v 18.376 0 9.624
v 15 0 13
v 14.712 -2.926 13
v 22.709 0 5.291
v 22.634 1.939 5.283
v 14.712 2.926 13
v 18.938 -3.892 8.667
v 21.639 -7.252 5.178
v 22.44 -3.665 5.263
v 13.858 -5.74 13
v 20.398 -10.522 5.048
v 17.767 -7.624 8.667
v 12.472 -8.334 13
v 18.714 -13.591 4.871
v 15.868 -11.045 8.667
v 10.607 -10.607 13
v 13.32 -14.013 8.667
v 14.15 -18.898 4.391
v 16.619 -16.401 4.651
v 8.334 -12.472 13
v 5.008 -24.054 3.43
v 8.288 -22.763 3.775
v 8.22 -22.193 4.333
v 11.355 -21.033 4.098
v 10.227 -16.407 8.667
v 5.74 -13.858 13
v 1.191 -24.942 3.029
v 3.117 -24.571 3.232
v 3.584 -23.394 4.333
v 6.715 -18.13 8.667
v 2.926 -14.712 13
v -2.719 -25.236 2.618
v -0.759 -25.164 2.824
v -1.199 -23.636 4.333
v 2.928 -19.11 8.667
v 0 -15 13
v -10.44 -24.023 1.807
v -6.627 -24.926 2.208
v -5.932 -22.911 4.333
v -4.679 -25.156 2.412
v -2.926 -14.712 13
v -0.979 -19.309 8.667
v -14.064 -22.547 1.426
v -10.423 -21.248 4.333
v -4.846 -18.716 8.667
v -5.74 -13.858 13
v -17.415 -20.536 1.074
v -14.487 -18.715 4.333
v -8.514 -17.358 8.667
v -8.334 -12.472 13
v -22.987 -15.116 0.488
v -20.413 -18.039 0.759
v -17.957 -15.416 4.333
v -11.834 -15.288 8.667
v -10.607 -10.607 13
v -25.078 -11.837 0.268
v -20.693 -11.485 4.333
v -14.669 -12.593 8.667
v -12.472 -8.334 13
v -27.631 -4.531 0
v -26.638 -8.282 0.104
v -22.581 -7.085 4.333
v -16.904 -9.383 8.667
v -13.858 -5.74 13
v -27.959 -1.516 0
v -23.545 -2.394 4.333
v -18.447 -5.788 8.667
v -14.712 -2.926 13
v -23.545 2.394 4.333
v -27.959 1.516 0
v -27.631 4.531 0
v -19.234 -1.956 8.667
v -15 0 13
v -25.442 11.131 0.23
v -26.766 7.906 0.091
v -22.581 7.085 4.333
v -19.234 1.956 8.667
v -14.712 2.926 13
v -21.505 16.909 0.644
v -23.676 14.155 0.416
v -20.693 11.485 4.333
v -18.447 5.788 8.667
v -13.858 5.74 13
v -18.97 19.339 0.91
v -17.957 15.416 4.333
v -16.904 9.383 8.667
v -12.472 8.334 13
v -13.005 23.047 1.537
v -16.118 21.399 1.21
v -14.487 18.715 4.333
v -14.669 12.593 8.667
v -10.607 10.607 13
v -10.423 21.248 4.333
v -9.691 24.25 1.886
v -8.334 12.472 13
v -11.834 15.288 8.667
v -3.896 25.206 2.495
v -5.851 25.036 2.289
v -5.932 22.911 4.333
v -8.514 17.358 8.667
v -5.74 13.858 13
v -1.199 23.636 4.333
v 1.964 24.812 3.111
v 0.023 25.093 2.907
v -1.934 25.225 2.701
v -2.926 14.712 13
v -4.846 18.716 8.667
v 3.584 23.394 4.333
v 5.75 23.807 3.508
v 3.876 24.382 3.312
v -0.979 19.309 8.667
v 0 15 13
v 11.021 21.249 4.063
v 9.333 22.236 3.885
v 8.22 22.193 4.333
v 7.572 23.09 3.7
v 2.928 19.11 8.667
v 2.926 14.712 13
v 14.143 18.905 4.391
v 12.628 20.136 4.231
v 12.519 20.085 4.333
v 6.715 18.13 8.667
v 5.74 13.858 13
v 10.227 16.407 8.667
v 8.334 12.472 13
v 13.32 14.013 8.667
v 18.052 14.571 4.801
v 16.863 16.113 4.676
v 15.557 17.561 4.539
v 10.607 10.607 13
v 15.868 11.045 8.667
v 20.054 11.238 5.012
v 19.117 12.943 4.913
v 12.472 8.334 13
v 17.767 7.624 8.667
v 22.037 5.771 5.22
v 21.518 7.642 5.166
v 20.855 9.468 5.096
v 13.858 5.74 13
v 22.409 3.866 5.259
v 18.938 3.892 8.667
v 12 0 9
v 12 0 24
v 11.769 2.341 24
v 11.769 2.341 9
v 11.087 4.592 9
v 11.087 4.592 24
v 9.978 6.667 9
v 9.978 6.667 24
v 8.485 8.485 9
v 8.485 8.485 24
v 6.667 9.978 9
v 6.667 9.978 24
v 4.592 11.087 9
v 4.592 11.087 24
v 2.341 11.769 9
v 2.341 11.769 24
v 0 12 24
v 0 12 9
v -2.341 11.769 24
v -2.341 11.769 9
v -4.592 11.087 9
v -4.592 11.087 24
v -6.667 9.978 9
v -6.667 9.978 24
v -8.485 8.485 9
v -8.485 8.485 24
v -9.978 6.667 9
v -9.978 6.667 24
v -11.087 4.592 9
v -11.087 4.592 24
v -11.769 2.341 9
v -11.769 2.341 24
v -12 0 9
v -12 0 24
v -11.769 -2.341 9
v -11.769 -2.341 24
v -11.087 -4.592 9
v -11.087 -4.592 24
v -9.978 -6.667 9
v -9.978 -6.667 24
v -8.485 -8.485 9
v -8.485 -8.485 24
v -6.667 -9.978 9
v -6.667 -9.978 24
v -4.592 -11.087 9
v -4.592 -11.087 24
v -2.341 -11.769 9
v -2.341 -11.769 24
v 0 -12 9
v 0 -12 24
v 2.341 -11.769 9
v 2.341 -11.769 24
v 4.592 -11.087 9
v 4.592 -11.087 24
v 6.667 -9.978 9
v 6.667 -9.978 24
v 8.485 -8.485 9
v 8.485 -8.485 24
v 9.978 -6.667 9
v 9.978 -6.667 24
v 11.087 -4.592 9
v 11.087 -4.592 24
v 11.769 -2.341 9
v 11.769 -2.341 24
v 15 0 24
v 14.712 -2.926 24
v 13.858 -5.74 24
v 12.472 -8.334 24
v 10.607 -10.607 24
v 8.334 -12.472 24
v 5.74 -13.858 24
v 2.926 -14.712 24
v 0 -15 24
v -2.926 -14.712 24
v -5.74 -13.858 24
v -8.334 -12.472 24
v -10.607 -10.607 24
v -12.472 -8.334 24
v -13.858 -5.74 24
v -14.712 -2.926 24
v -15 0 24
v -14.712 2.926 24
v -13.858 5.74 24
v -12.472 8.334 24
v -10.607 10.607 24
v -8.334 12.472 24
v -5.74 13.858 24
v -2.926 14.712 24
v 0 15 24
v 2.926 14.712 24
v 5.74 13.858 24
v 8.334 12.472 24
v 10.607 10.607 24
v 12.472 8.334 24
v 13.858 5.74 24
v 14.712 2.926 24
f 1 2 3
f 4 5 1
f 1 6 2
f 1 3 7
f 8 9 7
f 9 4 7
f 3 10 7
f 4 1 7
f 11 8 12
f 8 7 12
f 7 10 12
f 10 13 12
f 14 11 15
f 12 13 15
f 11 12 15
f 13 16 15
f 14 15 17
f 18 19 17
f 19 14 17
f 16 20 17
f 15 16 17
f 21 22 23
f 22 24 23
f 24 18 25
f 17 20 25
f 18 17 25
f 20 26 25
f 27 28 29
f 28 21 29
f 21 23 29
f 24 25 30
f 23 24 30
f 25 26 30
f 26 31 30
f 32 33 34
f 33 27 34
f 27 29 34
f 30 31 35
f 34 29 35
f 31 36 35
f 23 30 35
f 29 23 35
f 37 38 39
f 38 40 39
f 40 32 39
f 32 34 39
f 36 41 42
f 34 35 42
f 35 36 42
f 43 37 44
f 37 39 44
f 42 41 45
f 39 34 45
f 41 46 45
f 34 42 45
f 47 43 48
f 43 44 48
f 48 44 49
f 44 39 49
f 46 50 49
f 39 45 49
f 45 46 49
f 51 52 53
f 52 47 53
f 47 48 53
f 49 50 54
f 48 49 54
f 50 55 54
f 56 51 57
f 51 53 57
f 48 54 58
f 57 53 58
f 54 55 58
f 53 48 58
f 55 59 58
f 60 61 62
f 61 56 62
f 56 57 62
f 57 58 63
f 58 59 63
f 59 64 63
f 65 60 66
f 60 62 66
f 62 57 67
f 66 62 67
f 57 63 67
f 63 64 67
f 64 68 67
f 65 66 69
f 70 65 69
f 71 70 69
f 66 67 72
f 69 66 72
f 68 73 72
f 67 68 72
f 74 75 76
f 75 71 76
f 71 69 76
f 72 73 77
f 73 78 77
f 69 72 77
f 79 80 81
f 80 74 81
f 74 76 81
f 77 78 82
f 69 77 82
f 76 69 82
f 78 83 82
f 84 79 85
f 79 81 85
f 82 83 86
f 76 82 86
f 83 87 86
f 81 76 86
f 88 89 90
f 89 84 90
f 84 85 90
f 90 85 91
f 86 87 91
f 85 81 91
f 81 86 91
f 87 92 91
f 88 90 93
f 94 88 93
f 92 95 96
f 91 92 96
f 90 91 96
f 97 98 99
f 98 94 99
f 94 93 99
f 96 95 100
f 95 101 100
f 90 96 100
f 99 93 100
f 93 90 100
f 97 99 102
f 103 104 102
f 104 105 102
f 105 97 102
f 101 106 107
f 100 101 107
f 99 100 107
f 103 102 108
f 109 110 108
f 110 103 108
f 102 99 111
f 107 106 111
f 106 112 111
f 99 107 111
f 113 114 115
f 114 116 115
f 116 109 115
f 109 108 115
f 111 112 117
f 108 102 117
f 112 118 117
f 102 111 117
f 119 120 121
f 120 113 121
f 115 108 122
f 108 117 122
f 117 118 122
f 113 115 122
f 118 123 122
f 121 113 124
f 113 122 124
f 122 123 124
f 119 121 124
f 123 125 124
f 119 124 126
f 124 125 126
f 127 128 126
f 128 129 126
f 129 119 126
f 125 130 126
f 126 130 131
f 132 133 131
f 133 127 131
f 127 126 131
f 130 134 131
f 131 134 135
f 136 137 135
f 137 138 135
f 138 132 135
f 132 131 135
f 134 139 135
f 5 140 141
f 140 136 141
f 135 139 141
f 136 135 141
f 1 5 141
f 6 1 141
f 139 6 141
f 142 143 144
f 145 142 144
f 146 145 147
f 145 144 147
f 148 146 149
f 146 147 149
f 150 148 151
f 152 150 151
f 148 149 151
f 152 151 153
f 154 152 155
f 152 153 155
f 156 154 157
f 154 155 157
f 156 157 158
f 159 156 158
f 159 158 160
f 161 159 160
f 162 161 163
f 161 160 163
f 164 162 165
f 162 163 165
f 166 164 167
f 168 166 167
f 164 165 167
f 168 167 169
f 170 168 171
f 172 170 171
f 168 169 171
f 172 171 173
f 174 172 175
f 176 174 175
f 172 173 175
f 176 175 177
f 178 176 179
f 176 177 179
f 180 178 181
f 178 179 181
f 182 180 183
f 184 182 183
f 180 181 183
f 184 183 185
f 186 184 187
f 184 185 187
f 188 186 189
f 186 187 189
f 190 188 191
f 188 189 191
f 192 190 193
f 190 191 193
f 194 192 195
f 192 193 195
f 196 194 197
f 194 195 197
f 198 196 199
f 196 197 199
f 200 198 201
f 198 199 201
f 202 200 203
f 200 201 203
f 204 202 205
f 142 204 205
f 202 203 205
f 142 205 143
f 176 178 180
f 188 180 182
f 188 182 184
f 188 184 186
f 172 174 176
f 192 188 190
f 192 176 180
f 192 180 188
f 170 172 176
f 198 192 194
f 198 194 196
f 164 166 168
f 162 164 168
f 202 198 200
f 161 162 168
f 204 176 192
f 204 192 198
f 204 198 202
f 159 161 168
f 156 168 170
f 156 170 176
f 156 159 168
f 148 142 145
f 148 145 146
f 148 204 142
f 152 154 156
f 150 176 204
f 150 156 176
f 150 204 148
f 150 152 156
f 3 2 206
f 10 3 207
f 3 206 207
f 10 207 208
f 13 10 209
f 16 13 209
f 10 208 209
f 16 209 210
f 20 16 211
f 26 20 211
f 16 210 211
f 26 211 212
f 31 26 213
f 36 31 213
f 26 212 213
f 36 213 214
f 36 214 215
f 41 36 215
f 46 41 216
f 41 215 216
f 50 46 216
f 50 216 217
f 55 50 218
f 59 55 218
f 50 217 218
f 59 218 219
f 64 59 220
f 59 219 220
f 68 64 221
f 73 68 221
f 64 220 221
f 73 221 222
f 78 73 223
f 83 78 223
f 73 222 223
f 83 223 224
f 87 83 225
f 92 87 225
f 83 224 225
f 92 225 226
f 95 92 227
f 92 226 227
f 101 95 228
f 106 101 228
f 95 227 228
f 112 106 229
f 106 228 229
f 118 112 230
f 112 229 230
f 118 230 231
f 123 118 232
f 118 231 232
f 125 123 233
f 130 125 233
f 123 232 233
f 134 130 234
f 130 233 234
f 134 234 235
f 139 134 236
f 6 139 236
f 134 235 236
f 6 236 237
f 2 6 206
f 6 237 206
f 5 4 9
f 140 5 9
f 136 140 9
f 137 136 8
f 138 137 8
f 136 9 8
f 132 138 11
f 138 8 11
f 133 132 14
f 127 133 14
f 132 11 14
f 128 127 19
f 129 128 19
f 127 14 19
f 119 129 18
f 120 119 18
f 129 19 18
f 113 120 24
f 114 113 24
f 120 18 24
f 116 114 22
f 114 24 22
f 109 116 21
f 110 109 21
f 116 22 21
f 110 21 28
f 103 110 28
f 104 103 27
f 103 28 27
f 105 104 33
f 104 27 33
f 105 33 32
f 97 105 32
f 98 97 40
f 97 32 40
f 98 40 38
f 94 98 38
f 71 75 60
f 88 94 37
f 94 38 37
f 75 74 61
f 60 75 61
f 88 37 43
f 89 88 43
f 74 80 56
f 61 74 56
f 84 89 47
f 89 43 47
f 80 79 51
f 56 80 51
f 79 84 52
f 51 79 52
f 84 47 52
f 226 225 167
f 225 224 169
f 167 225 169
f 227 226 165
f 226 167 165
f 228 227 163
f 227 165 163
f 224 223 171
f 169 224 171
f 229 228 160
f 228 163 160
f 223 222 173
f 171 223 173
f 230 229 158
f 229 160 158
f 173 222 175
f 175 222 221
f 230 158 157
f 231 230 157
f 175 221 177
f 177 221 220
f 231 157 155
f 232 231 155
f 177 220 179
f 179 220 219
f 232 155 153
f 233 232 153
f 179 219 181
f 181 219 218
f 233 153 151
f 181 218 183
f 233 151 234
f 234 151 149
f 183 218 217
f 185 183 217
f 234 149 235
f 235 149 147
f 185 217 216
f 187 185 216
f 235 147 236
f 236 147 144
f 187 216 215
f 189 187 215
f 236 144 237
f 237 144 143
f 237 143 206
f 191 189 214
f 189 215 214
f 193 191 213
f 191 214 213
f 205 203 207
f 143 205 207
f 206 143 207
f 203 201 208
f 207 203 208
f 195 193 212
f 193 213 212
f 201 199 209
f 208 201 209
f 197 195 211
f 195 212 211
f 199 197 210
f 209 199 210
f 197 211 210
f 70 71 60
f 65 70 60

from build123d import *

# Parameters (mm, degrees)
F2_R     = 12
F3_DEPTH = 15
F5_DEPTH = 50


with BuildPart() as f1:
    # F0 (on Front) → F1 (revolve)
    with BuildSketch(Plane.XZ):
        Polygon((0, 24), (0, 0), (28, 0), (15, 13), (15, 24), align=None)
    revolve(axis=Axis((0, 0, 12), (0, 0, -1)))

    # F2 (on face) → F3 (cut)
    with BuildSketch(Plane.XY.offset(24)):
        Circle(F2_R)
    extrude(amount=-F3_DEPTH, mode=Mode.SUBTRACT)

    # F4 (on Front) → F5 (cut, symmetric)
    with BuildSketch(Plane.XZ):
        Polygon((33.364898, 6.410917), (-27.630899, 0), (33.364898, 0), align=None)
    extrude(amount=F5_DEPTH, both=True, mode=Mode.SUBTRACT)


solid = f1.part
